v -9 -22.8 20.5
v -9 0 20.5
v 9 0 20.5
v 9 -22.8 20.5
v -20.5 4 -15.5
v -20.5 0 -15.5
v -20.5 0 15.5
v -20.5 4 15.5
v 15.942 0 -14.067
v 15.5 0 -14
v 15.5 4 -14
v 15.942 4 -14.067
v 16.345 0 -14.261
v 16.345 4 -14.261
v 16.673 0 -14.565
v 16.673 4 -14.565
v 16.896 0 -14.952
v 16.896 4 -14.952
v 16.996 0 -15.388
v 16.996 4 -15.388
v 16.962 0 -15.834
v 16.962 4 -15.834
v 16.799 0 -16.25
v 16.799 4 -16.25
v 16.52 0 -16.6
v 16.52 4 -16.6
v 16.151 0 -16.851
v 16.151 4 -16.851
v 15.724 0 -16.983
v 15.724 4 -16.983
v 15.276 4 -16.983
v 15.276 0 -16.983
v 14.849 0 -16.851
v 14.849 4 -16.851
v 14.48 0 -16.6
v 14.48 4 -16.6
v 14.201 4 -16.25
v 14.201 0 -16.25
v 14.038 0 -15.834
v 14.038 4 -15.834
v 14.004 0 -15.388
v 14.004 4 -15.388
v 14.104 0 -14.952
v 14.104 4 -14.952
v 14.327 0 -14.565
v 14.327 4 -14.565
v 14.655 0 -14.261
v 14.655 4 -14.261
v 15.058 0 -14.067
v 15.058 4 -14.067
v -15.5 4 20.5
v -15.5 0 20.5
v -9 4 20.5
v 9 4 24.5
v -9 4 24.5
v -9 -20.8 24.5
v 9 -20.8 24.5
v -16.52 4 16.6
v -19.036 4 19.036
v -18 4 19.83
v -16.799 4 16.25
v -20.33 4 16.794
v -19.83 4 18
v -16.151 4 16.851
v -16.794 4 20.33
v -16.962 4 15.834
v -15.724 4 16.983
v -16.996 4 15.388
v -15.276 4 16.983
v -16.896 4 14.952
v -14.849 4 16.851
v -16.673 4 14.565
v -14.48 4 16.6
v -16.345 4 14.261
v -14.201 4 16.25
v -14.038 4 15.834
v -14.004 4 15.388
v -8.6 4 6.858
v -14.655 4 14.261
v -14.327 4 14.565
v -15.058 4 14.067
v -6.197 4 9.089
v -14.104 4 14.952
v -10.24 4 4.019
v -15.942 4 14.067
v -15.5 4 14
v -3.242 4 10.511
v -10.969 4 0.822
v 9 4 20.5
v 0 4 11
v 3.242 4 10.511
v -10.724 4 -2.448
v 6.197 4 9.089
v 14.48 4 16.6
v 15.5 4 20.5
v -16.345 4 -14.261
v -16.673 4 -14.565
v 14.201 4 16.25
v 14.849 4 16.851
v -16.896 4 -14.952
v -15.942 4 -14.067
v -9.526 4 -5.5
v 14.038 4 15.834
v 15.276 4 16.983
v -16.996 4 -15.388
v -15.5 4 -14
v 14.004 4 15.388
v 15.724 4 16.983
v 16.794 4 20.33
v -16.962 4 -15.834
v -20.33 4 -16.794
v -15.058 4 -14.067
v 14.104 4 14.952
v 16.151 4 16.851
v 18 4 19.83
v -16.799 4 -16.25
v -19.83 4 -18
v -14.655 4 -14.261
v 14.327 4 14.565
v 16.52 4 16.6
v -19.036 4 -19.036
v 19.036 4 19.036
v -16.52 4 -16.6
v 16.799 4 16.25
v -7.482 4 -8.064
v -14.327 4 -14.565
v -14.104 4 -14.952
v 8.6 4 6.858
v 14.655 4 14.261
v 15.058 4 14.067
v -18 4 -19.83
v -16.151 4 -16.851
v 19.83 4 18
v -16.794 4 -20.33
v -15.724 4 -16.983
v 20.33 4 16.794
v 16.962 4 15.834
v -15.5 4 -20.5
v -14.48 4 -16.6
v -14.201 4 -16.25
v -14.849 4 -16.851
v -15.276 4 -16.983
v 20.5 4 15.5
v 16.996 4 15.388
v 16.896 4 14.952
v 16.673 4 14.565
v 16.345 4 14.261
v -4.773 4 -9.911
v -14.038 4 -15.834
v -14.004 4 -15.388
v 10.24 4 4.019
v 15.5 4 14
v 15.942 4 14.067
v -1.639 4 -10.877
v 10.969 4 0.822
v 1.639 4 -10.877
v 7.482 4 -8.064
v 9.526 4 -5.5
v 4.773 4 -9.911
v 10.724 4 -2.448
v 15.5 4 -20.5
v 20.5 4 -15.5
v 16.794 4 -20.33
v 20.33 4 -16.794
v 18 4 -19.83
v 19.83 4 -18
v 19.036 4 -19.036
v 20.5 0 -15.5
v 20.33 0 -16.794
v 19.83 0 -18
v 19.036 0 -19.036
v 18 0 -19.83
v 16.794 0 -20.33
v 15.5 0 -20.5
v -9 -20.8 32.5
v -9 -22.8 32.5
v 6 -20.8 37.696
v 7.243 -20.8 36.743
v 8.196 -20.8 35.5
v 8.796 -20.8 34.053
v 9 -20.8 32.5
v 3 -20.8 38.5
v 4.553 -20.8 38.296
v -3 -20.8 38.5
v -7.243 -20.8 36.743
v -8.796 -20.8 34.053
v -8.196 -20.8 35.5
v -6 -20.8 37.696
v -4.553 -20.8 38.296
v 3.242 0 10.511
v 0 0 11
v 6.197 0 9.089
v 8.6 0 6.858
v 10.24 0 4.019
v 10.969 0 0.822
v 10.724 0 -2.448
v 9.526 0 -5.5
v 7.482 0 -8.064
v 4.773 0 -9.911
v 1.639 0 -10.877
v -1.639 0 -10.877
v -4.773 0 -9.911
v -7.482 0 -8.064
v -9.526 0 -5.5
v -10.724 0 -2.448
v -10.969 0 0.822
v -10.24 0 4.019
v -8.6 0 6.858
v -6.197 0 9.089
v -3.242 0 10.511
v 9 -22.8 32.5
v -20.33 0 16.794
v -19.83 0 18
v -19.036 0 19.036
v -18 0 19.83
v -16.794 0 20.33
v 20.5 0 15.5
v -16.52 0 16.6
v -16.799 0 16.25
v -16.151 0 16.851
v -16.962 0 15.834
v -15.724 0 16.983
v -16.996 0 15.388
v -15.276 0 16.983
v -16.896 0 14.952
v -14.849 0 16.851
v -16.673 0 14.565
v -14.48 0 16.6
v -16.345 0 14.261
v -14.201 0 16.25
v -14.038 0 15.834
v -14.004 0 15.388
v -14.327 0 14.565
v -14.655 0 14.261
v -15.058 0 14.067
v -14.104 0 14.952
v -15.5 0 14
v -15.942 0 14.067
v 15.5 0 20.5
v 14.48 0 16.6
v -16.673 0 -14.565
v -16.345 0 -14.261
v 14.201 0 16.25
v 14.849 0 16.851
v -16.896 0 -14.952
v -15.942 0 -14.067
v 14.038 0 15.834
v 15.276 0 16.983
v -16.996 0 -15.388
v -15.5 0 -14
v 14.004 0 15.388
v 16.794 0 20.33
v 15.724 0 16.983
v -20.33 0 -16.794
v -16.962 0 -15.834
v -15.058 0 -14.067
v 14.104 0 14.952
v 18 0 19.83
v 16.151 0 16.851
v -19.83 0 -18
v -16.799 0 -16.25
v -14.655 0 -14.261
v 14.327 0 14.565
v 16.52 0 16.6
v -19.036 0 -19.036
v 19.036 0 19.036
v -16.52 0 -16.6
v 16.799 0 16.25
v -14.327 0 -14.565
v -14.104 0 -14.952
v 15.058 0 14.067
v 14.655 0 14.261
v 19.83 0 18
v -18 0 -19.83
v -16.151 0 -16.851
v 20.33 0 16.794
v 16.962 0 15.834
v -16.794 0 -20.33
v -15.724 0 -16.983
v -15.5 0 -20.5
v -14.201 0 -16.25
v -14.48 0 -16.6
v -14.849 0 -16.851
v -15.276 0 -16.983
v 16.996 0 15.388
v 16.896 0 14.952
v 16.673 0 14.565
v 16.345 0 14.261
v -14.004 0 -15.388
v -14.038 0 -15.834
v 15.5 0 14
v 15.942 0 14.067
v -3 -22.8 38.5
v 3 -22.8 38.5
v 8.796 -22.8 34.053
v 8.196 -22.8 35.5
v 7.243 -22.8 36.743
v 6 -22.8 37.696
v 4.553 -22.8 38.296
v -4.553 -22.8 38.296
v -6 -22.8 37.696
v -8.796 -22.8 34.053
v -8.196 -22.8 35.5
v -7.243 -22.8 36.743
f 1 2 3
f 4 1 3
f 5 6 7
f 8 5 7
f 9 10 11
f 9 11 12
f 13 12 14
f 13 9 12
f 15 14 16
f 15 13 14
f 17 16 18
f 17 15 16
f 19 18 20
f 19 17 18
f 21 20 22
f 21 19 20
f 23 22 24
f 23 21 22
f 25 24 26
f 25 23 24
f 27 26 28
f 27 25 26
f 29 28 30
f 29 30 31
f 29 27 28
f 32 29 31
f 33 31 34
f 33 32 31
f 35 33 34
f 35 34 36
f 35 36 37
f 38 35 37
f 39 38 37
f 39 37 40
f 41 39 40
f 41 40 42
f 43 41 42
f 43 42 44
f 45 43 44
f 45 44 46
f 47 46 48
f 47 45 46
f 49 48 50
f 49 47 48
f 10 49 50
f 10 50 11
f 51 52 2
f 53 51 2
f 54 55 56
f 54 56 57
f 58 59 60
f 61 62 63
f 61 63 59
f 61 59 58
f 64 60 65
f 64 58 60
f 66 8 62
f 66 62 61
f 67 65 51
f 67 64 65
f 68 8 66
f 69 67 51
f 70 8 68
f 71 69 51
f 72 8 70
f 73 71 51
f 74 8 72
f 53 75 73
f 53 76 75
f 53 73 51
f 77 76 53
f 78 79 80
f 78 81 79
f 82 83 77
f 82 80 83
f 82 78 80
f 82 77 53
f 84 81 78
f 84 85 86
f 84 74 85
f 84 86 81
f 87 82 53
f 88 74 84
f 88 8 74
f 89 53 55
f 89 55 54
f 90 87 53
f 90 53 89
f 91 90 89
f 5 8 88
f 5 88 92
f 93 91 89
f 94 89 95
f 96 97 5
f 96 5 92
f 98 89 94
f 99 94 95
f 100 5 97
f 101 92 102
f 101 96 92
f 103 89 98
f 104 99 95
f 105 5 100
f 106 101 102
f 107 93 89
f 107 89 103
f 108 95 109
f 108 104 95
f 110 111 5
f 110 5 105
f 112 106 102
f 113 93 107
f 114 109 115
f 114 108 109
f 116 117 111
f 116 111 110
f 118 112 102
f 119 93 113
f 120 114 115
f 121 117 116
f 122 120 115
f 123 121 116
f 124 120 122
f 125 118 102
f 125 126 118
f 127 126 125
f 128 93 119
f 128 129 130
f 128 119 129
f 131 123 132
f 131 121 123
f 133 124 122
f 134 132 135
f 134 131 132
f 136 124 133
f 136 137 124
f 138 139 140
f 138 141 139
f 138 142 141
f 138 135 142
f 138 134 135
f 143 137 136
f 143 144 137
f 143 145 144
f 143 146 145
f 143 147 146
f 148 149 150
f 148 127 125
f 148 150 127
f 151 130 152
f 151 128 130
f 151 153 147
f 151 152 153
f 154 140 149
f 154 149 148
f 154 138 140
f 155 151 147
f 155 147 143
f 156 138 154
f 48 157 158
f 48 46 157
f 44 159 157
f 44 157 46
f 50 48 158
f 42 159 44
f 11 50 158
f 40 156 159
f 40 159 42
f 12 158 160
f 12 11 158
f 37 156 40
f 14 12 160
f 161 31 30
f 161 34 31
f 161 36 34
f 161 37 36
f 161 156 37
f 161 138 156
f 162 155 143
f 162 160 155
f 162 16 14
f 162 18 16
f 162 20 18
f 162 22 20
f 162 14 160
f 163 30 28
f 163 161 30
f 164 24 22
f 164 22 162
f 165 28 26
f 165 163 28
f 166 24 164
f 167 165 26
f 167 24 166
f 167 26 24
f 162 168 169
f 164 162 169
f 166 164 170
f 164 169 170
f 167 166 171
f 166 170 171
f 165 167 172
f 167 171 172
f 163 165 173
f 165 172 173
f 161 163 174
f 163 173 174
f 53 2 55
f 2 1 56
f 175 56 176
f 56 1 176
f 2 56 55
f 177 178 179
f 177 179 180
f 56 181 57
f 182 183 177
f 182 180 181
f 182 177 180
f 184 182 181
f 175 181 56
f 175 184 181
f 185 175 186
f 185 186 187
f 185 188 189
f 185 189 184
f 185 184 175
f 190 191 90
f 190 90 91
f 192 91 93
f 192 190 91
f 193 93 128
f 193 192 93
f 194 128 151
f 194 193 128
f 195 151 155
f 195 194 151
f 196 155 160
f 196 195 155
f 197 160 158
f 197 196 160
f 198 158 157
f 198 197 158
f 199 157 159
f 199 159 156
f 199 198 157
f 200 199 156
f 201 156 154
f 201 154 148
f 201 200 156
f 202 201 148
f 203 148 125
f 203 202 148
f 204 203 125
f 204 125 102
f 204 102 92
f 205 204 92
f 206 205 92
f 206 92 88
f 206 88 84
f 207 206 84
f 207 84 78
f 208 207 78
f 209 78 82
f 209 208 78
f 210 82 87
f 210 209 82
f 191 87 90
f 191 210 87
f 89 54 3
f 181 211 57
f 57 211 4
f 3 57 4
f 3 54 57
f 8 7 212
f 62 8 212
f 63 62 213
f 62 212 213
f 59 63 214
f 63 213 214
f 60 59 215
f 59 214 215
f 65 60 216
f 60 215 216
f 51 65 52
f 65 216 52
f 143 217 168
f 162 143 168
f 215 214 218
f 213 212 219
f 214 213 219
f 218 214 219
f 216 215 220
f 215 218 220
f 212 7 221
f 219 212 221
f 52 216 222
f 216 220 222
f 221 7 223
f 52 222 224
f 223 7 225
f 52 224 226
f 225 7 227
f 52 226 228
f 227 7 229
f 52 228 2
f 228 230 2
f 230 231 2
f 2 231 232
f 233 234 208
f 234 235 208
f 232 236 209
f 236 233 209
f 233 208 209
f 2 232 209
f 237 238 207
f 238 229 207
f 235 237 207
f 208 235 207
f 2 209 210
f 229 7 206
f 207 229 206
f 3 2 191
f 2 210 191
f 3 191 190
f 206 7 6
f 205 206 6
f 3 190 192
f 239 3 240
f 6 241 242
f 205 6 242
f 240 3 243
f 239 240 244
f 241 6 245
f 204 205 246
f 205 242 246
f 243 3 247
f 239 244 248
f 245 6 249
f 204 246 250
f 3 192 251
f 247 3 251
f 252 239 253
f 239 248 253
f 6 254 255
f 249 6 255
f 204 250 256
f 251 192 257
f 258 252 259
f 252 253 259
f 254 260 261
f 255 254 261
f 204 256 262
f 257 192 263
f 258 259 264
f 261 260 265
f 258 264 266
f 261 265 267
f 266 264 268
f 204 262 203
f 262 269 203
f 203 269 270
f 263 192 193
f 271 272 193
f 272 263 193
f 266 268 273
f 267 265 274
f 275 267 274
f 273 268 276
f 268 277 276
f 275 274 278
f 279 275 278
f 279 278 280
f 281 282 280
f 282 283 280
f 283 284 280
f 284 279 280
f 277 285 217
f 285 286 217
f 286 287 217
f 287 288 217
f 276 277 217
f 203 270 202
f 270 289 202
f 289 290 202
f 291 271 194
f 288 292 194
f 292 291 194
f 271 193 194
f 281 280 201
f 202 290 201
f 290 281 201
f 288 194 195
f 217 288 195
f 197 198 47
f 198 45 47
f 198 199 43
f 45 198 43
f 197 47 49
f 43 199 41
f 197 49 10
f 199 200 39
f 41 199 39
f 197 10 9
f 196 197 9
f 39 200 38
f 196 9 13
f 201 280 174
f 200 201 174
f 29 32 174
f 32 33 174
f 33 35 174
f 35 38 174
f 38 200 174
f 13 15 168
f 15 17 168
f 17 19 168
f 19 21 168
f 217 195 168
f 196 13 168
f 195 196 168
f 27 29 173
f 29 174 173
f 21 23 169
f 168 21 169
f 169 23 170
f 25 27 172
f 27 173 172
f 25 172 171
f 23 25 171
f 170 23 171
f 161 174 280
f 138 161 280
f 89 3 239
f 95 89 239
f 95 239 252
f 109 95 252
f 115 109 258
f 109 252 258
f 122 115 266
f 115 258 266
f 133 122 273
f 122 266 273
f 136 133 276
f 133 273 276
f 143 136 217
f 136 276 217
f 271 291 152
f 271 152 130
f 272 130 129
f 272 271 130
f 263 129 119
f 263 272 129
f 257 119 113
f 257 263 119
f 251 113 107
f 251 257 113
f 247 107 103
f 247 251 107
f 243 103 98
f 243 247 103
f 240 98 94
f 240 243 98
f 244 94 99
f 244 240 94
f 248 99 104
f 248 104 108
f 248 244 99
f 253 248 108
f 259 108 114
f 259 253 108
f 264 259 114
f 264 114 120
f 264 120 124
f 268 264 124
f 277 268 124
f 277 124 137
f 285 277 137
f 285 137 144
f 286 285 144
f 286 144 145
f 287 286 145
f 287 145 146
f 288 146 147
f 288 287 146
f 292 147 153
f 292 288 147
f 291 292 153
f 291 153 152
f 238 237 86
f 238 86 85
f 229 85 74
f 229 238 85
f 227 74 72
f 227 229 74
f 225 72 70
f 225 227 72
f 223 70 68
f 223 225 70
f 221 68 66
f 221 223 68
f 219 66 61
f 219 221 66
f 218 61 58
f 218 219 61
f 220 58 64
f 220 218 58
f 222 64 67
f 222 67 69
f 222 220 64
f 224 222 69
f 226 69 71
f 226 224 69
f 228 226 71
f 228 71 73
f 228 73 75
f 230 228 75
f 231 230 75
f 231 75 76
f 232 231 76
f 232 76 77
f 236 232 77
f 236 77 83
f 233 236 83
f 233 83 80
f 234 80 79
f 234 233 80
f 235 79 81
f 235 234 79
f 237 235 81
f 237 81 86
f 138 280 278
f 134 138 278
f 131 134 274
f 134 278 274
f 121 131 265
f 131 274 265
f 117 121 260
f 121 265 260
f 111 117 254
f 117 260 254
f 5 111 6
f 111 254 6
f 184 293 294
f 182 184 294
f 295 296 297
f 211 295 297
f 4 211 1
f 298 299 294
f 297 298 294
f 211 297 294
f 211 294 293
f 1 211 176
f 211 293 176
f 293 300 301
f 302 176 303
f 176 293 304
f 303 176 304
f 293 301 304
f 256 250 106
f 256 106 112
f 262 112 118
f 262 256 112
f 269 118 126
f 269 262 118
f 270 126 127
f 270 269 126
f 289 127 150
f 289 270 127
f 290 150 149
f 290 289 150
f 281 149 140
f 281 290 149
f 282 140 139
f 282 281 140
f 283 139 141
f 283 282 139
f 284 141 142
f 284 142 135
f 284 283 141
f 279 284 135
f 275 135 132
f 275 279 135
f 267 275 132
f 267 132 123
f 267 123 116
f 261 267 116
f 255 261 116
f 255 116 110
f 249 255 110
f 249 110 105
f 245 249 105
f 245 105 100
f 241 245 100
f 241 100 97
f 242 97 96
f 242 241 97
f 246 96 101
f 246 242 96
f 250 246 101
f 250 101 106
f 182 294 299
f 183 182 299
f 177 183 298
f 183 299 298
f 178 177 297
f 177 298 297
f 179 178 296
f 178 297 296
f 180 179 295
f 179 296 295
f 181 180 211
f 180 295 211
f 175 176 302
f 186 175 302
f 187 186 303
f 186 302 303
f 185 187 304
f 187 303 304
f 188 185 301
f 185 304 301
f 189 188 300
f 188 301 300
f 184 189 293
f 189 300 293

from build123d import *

# Parameters (mm, degrees)
SKETCH_2_R        = 11
SKETCH_2_R_2      = 1.5
EXTRUDE_483_DEPTH = 4
SKETCH_3_W        = 18
SKETCH_3_H        = 26.8
EXTRUDE_726_DEPTH = 4
EXTRUDE_922_DEPTH = 2


with BuildPart() as part:
    # Эскиз2 → Extrude 483 (new body)
    with BuildSketch(Plane(origin=(0, 0, 0), x_dir=(1, 0, 0), z_dir=(0, 1, 0))):
        with BuildLine():
            Line((-15.5, -20.5), (15.5, -20.5))
            ThreePointArc((15.5, -20.5), (19.035533906, -19.035533906), (20.5, -15.5))
            Line((20.5, -15.5), (20.5, 15.5))
            ThreePointArc((20.5, 15.5), (19.035533906, 19.035533906), (15.5, 20.5))
            Line((15.5, 20.5), (-15.5, 20.5))
            ThreePointArc((-15.5, 20.5), (-19.035533906, 19.035533906), (-20.5, 15.5))
            Line((-20.5, 15.5), (-20.5, -15.5))
            ThreePointArc((-20.5, -15.5), (-19.035533906, -19.035533906), (-15.5, -20.5))
        make_face()
        with Locations(Location((0, 0, 0), (0, 0, 270))):
            Circle(SKETCH_2_R, mode=Mode.SUBTRACT)
        with Locations(Location((-15.5, 15.5, 0), (0, 0, 270))):
            Circle(SKETCH_2_R_2, mode=Mode.SUBTRACT)
        with Locations(Location((15.5, -15.5, 0), (0, 0, 90))):
            Circle(SKETCH_2_R_2, mode=Mode.SUBTRACT)
        with Locations(Location((-15.5, -15.5, 0), (0, 0, 90))):
            Circle(SKETCH_2_R_2, mode=Mode.SUBTRACT)
        with Locations(Location((15.5, 15.5, 0), (0, 0, 270))):
            Circle(SKETCH_2_R_2, mode=Mode.SUBTRACT)
    extrude(amount=EXTRUDE_483_DEPTH)

    # Эскиз3 → Extrude 726 (add)
    with BuildSketch(Plane.XY.offset(20.5)):
        with Locations((0, -9.4)):
            Rectangle(SKETCH_3_W, SKETCH_3_H)
    extrude(amount=EXTRUDE_726_DEPTH)

    # Эскиз4 → Extrude 922 (add)
    with BuildSketch(Plane.XZ.offset(22.8)):
        with BuildLine():
            Line((9, 24.5), (-9, 24.5))
            Line((-9, 24.5), (-9, 32.5))
            ThreePointArc((-9, 32.5), (-7.242640687, 36.742640687), (-3, 38.5))
            Line((-3, 38.5), (3, 38.5))
            ThreePointArc((3, 38.5), (7.242640687, 36.742640687), (9, 32.5))
            Line((9, 32.5), (9, 24.5))
        make_face()
    extrude(amount=-EXTRUDE_922_DEPTH)


solid = part.part
